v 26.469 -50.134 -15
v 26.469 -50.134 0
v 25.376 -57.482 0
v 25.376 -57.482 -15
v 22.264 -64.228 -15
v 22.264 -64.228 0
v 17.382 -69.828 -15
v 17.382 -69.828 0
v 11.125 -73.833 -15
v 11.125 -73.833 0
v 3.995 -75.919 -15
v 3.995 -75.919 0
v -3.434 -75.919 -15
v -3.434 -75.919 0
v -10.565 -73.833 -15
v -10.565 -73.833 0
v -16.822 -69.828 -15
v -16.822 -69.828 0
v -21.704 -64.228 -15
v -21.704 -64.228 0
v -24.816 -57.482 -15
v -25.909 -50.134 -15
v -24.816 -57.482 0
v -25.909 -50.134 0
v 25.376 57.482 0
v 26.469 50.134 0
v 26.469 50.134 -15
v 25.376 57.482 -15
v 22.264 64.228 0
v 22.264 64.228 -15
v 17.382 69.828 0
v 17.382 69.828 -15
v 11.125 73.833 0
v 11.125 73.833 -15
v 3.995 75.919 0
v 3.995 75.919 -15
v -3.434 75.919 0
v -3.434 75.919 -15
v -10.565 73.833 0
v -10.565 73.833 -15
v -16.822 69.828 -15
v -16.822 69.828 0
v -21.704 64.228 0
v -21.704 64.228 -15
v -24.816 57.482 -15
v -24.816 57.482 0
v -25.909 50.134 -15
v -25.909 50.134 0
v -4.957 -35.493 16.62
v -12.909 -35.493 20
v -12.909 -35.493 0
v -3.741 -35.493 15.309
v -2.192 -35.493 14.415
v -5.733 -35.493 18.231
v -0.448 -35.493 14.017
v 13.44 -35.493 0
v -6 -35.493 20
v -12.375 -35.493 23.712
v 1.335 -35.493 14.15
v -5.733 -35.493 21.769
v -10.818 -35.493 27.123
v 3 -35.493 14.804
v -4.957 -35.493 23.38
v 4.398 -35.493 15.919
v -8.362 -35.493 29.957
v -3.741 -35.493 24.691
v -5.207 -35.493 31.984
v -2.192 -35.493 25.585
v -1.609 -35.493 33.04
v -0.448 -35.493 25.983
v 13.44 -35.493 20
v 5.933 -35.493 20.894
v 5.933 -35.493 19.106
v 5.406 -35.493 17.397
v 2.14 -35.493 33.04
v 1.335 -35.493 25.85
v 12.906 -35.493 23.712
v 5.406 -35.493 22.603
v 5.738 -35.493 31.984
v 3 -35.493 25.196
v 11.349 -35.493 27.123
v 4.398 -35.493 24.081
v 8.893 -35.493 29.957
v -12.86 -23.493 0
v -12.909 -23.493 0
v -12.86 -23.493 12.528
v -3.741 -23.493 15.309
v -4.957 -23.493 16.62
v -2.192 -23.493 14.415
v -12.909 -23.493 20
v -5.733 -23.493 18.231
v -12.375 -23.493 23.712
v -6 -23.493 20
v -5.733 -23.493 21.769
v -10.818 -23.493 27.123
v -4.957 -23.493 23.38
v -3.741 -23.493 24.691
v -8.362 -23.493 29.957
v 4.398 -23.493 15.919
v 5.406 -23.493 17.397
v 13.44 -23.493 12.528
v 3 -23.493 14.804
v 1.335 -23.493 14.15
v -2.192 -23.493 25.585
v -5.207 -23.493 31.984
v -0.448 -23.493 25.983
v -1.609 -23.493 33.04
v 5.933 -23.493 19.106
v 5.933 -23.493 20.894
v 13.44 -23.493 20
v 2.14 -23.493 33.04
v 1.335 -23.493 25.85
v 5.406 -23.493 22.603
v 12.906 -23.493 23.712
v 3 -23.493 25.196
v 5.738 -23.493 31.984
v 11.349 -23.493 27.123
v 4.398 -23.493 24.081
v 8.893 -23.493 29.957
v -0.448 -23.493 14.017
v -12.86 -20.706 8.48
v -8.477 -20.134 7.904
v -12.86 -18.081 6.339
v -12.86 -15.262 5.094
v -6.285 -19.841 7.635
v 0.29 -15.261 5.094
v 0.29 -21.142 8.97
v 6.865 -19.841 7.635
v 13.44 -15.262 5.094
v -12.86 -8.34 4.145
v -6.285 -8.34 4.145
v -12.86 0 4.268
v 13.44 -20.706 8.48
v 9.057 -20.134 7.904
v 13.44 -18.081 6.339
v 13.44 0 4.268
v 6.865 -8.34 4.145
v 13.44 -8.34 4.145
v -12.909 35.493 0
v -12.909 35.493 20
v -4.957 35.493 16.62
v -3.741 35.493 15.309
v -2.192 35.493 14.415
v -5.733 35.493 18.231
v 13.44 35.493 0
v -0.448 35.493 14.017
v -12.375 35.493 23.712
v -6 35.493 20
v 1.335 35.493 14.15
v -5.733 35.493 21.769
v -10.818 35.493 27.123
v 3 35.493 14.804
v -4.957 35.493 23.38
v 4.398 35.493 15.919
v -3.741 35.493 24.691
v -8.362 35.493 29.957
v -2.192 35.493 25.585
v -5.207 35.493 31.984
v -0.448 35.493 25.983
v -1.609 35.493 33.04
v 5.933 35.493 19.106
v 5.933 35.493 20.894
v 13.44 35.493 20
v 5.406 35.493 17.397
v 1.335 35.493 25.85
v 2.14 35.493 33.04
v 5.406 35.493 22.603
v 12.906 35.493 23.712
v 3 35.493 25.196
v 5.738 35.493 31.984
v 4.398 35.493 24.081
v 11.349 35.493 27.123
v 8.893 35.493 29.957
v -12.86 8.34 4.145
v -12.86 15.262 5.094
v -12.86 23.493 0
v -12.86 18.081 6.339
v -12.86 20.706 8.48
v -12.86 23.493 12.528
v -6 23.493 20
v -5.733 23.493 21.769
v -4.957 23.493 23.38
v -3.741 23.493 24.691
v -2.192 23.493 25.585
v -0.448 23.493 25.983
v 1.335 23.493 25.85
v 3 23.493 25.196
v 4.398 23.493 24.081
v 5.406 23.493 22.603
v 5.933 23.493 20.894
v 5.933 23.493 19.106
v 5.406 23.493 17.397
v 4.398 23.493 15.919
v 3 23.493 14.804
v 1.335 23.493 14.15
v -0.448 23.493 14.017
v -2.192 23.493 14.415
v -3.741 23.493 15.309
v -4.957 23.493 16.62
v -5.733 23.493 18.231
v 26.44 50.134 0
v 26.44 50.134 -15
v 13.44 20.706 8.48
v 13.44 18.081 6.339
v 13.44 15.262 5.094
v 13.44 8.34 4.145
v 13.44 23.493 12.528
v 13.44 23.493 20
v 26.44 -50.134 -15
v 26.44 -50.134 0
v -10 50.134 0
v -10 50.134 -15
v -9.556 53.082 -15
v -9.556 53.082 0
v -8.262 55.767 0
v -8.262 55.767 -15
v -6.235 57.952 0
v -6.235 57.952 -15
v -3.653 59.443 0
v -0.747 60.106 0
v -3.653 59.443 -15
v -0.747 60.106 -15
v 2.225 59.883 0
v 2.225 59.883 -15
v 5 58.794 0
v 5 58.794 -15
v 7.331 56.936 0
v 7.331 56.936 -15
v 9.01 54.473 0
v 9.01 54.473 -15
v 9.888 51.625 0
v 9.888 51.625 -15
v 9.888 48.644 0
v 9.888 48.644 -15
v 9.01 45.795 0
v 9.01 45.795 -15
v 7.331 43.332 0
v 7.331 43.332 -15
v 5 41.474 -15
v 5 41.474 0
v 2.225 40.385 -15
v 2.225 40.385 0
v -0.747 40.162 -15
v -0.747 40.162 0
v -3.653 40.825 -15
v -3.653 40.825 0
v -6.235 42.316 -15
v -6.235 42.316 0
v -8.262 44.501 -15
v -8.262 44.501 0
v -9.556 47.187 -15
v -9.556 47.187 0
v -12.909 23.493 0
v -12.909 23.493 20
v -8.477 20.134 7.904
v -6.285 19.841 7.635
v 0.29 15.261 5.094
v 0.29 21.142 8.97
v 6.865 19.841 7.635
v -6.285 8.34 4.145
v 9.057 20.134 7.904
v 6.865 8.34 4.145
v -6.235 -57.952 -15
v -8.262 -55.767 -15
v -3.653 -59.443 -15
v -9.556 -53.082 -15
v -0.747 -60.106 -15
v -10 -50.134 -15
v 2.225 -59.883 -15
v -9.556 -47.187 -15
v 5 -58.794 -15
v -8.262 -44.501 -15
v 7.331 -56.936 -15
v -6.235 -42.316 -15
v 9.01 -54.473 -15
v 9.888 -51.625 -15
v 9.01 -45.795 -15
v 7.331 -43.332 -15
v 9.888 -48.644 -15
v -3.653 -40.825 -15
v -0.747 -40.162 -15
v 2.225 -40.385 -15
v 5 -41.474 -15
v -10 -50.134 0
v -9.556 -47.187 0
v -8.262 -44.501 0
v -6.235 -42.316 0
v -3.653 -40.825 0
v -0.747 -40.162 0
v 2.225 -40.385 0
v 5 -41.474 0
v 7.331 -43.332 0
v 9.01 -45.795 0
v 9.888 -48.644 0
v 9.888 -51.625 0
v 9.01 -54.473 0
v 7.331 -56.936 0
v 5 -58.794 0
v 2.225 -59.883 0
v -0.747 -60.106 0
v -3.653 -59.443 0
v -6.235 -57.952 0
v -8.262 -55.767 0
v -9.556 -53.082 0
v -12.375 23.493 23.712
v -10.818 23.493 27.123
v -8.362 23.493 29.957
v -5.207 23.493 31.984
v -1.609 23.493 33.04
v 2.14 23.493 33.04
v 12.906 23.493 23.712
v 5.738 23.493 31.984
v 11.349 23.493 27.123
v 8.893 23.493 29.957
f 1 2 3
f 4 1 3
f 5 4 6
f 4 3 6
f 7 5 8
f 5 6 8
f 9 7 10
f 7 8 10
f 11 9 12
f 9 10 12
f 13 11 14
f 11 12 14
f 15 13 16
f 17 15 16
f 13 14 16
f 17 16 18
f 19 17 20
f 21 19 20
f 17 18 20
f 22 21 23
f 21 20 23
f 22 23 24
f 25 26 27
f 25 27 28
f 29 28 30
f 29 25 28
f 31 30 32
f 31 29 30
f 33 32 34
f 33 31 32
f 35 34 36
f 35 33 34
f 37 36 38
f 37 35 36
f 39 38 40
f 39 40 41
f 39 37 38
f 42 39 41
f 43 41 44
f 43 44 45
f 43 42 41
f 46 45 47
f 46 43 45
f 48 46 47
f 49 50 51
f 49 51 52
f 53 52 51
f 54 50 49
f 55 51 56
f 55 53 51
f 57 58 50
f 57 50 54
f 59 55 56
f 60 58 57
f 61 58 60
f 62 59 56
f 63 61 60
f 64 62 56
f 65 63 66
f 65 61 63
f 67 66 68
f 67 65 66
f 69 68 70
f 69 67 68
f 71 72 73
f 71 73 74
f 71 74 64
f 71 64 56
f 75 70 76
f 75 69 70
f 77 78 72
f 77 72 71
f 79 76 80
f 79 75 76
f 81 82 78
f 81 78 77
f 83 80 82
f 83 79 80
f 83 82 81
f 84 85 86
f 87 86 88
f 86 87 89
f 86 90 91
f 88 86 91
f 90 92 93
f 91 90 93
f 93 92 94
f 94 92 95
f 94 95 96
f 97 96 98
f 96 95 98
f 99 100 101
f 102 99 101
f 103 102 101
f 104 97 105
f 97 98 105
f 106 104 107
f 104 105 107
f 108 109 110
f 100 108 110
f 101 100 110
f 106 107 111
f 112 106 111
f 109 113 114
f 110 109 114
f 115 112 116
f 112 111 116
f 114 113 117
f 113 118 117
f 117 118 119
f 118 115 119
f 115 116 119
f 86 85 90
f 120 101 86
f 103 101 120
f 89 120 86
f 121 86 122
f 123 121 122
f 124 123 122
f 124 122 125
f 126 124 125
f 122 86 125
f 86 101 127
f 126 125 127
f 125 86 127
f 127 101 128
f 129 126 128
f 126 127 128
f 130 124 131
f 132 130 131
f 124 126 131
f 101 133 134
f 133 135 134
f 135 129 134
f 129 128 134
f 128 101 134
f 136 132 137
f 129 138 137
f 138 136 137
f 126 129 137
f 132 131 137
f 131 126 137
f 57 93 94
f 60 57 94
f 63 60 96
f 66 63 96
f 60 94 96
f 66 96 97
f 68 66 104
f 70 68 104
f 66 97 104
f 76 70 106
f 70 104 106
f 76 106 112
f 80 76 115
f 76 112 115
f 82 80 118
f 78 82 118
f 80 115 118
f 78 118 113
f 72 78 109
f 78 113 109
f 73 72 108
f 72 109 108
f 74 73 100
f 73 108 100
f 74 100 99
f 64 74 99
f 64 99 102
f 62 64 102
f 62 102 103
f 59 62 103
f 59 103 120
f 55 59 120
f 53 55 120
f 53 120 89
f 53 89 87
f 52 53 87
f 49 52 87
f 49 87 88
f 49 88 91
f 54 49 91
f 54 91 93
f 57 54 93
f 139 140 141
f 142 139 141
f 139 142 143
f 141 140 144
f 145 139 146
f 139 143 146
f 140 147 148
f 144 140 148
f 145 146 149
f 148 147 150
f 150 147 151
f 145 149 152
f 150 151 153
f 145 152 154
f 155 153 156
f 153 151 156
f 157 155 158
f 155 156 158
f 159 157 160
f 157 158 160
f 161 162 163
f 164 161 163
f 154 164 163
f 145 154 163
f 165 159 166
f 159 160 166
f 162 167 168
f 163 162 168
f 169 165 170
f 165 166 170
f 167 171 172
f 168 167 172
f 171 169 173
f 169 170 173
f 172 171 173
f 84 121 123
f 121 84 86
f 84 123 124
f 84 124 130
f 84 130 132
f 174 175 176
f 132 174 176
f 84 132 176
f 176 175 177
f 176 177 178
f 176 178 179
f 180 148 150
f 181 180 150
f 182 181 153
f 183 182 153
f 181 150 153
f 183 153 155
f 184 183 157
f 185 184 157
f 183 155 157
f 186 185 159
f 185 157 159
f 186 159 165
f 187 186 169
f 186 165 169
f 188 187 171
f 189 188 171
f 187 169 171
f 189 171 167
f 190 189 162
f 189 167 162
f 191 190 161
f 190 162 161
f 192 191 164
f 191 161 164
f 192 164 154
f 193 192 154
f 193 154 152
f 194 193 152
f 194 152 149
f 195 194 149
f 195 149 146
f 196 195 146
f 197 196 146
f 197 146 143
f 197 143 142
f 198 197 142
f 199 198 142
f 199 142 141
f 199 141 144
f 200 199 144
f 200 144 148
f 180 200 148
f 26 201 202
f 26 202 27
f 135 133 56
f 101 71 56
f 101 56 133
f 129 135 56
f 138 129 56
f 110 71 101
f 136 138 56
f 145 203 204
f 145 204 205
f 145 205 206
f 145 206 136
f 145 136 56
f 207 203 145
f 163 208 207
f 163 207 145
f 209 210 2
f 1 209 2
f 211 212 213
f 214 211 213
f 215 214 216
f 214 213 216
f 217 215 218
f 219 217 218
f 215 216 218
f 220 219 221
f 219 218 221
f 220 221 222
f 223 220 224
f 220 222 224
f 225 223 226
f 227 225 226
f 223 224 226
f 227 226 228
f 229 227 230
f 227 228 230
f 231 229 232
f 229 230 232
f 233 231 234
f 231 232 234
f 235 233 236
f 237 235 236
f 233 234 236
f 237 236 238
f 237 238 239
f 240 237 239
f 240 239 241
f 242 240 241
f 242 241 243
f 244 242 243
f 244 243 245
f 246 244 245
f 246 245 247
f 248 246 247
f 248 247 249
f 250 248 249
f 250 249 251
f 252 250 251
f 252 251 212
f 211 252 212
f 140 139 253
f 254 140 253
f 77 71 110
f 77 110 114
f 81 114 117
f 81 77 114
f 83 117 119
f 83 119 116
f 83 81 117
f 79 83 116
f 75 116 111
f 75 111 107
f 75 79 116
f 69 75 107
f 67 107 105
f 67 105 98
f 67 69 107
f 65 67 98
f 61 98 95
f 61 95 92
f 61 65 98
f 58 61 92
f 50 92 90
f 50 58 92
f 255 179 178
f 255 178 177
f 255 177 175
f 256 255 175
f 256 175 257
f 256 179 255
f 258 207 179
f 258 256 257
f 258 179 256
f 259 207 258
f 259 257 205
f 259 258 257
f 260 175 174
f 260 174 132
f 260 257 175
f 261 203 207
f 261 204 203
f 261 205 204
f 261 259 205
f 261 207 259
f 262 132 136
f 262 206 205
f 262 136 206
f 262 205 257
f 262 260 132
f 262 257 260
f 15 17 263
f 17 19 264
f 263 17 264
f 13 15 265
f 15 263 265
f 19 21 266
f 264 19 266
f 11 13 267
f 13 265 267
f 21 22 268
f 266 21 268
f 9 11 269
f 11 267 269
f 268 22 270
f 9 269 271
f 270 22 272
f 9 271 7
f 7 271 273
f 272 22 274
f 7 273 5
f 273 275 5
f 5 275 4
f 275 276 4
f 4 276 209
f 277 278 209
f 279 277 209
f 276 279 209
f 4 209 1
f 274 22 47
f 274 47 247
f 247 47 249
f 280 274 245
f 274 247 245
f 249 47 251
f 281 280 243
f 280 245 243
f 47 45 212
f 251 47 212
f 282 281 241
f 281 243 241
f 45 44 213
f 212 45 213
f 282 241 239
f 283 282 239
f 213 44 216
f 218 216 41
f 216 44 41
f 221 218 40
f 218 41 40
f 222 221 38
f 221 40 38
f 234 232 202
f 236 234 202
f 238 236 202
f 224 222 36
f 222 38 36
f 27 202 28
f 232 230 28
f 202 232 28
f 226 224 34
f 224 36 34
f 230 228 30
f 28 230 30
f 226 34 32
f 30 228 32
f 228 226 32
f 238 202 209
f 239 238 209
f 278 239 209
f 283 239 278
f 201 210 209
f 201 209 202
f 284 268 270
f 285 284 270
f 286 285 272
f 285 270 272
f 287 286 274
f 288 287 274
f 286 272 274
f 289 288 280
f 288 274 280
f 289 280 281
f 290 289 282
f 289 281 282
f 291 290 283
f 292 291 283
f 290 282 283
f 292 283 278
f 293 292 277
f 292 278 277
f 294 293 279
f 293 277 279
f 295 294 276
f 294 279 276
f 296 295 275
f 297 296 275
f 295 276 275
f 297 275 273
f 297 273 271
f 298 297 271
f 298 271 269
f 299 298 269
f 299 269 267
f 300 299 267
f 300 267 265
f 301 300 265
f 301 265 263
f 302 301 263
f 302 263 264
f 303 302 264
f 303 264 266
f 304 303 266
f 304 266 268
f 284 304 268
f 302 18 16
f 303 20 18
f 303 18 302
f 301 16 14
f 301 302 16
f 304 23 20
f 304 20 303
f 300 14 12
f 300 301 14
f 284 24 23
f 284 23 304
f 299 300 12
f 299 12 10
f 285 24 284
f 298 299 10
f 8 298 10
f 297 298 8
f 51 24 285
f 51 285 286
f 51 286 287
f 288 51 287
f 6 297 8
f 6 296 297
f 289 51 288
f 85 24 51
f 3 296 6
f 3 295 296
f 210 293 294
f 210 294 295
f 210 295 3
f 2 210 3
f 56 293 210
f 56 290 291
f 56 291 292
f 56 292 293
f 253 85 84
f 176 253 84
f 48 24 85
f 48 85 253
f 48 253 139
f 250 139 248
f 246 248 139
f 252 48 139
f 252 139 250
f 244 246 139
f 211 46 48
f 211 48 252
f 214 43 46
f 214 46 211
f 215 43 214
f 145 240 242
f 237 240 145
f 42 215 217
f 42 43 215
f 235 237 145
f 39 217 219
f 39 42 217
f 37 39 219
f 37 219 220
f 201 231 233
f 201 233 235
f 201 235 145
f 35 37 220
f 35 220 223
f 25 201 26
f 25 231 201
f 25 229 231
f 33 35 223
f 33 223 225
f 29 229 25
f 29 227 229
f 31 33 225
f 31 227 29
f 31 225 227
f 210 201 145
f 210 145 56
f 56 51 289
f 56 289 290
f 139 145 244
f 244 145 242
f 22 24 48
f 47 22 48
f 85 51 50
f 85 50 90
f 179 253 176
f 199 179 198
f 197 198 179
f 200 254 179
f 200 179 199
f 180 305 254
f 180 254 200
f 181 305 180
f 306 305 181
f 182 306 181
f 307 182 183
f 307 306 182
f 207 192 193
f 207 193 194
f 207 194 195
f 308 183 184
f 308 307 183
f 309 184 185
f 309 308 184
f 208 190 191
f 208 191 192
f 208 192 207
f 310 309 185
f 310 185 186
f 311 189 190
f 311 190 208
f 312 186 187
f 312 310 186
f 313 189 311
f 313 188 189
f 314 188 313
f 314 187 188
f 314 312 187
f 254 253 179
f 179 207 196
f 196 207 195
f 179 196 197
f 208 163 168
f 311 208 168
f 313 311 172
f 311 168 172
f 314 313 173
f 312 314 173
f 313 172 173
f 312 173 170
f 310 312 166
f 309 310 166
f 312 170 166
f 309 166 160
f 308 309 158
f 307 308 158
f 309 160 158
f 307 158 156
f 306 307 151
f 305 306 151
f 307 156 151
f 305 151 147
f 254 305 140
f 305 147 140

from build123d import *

# Parameters (mm, degrees)
F0_W     = 52.3490961641
F0_H     = 100.1019440591
F1_DEPTH = 15
F2_W     = 26.3490961641
F2_H     = 12
F3_DEPTH = 20
F5_DEPTH = 12
F7_DEPTH = 26.3
F10_D    = 12
F12_D    = 20


with BuildPart() as f1:
    # F0 (on Top) → F1 (new body)
    with BuildSketch(Plane.XY):
        with BuildLine():
            Line((26.4400355518, 50.134152174), (26.4692548662, 50.134152174))
            ThreePointArc((26.4692548662, 50.134152174), (0.280097127, 76.1836339389), (-25.9090606123, 50.134152174))
            Line((-25.9090606123, 50.134152174), (26.4400355518, 50.134152174))
        make_face()
        with Locations((0.2654874697, 0.0831801444)):
            Rectangle(F0_W, F0_H)
        with BuildLine():
            Line((26.4400355518, -49.9677918851), (-25.9090606123, -49.9677918851))
            ThreePointArc((-25.9090606123, -49.9677918851), (0.2654874697, -76.1423399672), (26.4400355518, -49.9677918851))
        make_face()
    extrude(amount=-F1_DEPTH)

    # F2 (on Top) → F3 (join)
    with BuildSketch(Plane.XY):
        with Locations((0.2654874697, -29.4927601161)):
            Rectangle(F2_W, F2_H)
    extrude(amount=F3_DEPTH)

    # F4 (on face) → F5 (join)
    with BuildSketch(Plane.XZ.offset(35.4927601161)):
        with BuildLine():
            Line((-12.9090606123, 20), (13.4400355518, 20))
            ThreePointArc((13.4400355518, 20), (0.2654874697, 33.1745480821), (-12.9090606123, 20))
        make_face()
    extrude(amount=-F5_DEPTH)

    # F6 (on face) → F7 (join)
    with BuildSketch(Plane.YZ.offset(13.4400355518)):
        with BuildLine():
            add(Edge.make_bspline(
                [(-23.4927601161, 12.5284092501), (-21.2797119115, 8.3236057962), (-15.6986097687, 3.625344109), (-5.9415775516, 4.0916807862), (0, 4.2679198086)],
                knots=[0, 0, 0, 0, 0.4600140191, 1, 1, 1, 1], degree=3))
            Line((-23.4927601161, 12.5284092501), (-23.4927601161, 0))
            Line((-23.4927601161, 0), (0, 0))
            Line((0, 0), (0, 4.2679198086))
        make_face()
    extrude(amount=-F7_DEPTH)

    # F8: F1 across plane


with BuildPart() as f1_1:
    add(f1.part)
    add(f1.part.mirror(Plane.XZ))

    # F10 (through all)
    with Locations(Plane.XZ.offset(35.4927601161)):
        with Locations((0, 20)):
            Hole(F10_D / 2)

    # F12 (through all)
    with Locations(Plane.XY):
        with Locations((0, 50.134152174), (0, -50.134152174)):
            Hole(F12_D / 2)


solid = f1_1.part
